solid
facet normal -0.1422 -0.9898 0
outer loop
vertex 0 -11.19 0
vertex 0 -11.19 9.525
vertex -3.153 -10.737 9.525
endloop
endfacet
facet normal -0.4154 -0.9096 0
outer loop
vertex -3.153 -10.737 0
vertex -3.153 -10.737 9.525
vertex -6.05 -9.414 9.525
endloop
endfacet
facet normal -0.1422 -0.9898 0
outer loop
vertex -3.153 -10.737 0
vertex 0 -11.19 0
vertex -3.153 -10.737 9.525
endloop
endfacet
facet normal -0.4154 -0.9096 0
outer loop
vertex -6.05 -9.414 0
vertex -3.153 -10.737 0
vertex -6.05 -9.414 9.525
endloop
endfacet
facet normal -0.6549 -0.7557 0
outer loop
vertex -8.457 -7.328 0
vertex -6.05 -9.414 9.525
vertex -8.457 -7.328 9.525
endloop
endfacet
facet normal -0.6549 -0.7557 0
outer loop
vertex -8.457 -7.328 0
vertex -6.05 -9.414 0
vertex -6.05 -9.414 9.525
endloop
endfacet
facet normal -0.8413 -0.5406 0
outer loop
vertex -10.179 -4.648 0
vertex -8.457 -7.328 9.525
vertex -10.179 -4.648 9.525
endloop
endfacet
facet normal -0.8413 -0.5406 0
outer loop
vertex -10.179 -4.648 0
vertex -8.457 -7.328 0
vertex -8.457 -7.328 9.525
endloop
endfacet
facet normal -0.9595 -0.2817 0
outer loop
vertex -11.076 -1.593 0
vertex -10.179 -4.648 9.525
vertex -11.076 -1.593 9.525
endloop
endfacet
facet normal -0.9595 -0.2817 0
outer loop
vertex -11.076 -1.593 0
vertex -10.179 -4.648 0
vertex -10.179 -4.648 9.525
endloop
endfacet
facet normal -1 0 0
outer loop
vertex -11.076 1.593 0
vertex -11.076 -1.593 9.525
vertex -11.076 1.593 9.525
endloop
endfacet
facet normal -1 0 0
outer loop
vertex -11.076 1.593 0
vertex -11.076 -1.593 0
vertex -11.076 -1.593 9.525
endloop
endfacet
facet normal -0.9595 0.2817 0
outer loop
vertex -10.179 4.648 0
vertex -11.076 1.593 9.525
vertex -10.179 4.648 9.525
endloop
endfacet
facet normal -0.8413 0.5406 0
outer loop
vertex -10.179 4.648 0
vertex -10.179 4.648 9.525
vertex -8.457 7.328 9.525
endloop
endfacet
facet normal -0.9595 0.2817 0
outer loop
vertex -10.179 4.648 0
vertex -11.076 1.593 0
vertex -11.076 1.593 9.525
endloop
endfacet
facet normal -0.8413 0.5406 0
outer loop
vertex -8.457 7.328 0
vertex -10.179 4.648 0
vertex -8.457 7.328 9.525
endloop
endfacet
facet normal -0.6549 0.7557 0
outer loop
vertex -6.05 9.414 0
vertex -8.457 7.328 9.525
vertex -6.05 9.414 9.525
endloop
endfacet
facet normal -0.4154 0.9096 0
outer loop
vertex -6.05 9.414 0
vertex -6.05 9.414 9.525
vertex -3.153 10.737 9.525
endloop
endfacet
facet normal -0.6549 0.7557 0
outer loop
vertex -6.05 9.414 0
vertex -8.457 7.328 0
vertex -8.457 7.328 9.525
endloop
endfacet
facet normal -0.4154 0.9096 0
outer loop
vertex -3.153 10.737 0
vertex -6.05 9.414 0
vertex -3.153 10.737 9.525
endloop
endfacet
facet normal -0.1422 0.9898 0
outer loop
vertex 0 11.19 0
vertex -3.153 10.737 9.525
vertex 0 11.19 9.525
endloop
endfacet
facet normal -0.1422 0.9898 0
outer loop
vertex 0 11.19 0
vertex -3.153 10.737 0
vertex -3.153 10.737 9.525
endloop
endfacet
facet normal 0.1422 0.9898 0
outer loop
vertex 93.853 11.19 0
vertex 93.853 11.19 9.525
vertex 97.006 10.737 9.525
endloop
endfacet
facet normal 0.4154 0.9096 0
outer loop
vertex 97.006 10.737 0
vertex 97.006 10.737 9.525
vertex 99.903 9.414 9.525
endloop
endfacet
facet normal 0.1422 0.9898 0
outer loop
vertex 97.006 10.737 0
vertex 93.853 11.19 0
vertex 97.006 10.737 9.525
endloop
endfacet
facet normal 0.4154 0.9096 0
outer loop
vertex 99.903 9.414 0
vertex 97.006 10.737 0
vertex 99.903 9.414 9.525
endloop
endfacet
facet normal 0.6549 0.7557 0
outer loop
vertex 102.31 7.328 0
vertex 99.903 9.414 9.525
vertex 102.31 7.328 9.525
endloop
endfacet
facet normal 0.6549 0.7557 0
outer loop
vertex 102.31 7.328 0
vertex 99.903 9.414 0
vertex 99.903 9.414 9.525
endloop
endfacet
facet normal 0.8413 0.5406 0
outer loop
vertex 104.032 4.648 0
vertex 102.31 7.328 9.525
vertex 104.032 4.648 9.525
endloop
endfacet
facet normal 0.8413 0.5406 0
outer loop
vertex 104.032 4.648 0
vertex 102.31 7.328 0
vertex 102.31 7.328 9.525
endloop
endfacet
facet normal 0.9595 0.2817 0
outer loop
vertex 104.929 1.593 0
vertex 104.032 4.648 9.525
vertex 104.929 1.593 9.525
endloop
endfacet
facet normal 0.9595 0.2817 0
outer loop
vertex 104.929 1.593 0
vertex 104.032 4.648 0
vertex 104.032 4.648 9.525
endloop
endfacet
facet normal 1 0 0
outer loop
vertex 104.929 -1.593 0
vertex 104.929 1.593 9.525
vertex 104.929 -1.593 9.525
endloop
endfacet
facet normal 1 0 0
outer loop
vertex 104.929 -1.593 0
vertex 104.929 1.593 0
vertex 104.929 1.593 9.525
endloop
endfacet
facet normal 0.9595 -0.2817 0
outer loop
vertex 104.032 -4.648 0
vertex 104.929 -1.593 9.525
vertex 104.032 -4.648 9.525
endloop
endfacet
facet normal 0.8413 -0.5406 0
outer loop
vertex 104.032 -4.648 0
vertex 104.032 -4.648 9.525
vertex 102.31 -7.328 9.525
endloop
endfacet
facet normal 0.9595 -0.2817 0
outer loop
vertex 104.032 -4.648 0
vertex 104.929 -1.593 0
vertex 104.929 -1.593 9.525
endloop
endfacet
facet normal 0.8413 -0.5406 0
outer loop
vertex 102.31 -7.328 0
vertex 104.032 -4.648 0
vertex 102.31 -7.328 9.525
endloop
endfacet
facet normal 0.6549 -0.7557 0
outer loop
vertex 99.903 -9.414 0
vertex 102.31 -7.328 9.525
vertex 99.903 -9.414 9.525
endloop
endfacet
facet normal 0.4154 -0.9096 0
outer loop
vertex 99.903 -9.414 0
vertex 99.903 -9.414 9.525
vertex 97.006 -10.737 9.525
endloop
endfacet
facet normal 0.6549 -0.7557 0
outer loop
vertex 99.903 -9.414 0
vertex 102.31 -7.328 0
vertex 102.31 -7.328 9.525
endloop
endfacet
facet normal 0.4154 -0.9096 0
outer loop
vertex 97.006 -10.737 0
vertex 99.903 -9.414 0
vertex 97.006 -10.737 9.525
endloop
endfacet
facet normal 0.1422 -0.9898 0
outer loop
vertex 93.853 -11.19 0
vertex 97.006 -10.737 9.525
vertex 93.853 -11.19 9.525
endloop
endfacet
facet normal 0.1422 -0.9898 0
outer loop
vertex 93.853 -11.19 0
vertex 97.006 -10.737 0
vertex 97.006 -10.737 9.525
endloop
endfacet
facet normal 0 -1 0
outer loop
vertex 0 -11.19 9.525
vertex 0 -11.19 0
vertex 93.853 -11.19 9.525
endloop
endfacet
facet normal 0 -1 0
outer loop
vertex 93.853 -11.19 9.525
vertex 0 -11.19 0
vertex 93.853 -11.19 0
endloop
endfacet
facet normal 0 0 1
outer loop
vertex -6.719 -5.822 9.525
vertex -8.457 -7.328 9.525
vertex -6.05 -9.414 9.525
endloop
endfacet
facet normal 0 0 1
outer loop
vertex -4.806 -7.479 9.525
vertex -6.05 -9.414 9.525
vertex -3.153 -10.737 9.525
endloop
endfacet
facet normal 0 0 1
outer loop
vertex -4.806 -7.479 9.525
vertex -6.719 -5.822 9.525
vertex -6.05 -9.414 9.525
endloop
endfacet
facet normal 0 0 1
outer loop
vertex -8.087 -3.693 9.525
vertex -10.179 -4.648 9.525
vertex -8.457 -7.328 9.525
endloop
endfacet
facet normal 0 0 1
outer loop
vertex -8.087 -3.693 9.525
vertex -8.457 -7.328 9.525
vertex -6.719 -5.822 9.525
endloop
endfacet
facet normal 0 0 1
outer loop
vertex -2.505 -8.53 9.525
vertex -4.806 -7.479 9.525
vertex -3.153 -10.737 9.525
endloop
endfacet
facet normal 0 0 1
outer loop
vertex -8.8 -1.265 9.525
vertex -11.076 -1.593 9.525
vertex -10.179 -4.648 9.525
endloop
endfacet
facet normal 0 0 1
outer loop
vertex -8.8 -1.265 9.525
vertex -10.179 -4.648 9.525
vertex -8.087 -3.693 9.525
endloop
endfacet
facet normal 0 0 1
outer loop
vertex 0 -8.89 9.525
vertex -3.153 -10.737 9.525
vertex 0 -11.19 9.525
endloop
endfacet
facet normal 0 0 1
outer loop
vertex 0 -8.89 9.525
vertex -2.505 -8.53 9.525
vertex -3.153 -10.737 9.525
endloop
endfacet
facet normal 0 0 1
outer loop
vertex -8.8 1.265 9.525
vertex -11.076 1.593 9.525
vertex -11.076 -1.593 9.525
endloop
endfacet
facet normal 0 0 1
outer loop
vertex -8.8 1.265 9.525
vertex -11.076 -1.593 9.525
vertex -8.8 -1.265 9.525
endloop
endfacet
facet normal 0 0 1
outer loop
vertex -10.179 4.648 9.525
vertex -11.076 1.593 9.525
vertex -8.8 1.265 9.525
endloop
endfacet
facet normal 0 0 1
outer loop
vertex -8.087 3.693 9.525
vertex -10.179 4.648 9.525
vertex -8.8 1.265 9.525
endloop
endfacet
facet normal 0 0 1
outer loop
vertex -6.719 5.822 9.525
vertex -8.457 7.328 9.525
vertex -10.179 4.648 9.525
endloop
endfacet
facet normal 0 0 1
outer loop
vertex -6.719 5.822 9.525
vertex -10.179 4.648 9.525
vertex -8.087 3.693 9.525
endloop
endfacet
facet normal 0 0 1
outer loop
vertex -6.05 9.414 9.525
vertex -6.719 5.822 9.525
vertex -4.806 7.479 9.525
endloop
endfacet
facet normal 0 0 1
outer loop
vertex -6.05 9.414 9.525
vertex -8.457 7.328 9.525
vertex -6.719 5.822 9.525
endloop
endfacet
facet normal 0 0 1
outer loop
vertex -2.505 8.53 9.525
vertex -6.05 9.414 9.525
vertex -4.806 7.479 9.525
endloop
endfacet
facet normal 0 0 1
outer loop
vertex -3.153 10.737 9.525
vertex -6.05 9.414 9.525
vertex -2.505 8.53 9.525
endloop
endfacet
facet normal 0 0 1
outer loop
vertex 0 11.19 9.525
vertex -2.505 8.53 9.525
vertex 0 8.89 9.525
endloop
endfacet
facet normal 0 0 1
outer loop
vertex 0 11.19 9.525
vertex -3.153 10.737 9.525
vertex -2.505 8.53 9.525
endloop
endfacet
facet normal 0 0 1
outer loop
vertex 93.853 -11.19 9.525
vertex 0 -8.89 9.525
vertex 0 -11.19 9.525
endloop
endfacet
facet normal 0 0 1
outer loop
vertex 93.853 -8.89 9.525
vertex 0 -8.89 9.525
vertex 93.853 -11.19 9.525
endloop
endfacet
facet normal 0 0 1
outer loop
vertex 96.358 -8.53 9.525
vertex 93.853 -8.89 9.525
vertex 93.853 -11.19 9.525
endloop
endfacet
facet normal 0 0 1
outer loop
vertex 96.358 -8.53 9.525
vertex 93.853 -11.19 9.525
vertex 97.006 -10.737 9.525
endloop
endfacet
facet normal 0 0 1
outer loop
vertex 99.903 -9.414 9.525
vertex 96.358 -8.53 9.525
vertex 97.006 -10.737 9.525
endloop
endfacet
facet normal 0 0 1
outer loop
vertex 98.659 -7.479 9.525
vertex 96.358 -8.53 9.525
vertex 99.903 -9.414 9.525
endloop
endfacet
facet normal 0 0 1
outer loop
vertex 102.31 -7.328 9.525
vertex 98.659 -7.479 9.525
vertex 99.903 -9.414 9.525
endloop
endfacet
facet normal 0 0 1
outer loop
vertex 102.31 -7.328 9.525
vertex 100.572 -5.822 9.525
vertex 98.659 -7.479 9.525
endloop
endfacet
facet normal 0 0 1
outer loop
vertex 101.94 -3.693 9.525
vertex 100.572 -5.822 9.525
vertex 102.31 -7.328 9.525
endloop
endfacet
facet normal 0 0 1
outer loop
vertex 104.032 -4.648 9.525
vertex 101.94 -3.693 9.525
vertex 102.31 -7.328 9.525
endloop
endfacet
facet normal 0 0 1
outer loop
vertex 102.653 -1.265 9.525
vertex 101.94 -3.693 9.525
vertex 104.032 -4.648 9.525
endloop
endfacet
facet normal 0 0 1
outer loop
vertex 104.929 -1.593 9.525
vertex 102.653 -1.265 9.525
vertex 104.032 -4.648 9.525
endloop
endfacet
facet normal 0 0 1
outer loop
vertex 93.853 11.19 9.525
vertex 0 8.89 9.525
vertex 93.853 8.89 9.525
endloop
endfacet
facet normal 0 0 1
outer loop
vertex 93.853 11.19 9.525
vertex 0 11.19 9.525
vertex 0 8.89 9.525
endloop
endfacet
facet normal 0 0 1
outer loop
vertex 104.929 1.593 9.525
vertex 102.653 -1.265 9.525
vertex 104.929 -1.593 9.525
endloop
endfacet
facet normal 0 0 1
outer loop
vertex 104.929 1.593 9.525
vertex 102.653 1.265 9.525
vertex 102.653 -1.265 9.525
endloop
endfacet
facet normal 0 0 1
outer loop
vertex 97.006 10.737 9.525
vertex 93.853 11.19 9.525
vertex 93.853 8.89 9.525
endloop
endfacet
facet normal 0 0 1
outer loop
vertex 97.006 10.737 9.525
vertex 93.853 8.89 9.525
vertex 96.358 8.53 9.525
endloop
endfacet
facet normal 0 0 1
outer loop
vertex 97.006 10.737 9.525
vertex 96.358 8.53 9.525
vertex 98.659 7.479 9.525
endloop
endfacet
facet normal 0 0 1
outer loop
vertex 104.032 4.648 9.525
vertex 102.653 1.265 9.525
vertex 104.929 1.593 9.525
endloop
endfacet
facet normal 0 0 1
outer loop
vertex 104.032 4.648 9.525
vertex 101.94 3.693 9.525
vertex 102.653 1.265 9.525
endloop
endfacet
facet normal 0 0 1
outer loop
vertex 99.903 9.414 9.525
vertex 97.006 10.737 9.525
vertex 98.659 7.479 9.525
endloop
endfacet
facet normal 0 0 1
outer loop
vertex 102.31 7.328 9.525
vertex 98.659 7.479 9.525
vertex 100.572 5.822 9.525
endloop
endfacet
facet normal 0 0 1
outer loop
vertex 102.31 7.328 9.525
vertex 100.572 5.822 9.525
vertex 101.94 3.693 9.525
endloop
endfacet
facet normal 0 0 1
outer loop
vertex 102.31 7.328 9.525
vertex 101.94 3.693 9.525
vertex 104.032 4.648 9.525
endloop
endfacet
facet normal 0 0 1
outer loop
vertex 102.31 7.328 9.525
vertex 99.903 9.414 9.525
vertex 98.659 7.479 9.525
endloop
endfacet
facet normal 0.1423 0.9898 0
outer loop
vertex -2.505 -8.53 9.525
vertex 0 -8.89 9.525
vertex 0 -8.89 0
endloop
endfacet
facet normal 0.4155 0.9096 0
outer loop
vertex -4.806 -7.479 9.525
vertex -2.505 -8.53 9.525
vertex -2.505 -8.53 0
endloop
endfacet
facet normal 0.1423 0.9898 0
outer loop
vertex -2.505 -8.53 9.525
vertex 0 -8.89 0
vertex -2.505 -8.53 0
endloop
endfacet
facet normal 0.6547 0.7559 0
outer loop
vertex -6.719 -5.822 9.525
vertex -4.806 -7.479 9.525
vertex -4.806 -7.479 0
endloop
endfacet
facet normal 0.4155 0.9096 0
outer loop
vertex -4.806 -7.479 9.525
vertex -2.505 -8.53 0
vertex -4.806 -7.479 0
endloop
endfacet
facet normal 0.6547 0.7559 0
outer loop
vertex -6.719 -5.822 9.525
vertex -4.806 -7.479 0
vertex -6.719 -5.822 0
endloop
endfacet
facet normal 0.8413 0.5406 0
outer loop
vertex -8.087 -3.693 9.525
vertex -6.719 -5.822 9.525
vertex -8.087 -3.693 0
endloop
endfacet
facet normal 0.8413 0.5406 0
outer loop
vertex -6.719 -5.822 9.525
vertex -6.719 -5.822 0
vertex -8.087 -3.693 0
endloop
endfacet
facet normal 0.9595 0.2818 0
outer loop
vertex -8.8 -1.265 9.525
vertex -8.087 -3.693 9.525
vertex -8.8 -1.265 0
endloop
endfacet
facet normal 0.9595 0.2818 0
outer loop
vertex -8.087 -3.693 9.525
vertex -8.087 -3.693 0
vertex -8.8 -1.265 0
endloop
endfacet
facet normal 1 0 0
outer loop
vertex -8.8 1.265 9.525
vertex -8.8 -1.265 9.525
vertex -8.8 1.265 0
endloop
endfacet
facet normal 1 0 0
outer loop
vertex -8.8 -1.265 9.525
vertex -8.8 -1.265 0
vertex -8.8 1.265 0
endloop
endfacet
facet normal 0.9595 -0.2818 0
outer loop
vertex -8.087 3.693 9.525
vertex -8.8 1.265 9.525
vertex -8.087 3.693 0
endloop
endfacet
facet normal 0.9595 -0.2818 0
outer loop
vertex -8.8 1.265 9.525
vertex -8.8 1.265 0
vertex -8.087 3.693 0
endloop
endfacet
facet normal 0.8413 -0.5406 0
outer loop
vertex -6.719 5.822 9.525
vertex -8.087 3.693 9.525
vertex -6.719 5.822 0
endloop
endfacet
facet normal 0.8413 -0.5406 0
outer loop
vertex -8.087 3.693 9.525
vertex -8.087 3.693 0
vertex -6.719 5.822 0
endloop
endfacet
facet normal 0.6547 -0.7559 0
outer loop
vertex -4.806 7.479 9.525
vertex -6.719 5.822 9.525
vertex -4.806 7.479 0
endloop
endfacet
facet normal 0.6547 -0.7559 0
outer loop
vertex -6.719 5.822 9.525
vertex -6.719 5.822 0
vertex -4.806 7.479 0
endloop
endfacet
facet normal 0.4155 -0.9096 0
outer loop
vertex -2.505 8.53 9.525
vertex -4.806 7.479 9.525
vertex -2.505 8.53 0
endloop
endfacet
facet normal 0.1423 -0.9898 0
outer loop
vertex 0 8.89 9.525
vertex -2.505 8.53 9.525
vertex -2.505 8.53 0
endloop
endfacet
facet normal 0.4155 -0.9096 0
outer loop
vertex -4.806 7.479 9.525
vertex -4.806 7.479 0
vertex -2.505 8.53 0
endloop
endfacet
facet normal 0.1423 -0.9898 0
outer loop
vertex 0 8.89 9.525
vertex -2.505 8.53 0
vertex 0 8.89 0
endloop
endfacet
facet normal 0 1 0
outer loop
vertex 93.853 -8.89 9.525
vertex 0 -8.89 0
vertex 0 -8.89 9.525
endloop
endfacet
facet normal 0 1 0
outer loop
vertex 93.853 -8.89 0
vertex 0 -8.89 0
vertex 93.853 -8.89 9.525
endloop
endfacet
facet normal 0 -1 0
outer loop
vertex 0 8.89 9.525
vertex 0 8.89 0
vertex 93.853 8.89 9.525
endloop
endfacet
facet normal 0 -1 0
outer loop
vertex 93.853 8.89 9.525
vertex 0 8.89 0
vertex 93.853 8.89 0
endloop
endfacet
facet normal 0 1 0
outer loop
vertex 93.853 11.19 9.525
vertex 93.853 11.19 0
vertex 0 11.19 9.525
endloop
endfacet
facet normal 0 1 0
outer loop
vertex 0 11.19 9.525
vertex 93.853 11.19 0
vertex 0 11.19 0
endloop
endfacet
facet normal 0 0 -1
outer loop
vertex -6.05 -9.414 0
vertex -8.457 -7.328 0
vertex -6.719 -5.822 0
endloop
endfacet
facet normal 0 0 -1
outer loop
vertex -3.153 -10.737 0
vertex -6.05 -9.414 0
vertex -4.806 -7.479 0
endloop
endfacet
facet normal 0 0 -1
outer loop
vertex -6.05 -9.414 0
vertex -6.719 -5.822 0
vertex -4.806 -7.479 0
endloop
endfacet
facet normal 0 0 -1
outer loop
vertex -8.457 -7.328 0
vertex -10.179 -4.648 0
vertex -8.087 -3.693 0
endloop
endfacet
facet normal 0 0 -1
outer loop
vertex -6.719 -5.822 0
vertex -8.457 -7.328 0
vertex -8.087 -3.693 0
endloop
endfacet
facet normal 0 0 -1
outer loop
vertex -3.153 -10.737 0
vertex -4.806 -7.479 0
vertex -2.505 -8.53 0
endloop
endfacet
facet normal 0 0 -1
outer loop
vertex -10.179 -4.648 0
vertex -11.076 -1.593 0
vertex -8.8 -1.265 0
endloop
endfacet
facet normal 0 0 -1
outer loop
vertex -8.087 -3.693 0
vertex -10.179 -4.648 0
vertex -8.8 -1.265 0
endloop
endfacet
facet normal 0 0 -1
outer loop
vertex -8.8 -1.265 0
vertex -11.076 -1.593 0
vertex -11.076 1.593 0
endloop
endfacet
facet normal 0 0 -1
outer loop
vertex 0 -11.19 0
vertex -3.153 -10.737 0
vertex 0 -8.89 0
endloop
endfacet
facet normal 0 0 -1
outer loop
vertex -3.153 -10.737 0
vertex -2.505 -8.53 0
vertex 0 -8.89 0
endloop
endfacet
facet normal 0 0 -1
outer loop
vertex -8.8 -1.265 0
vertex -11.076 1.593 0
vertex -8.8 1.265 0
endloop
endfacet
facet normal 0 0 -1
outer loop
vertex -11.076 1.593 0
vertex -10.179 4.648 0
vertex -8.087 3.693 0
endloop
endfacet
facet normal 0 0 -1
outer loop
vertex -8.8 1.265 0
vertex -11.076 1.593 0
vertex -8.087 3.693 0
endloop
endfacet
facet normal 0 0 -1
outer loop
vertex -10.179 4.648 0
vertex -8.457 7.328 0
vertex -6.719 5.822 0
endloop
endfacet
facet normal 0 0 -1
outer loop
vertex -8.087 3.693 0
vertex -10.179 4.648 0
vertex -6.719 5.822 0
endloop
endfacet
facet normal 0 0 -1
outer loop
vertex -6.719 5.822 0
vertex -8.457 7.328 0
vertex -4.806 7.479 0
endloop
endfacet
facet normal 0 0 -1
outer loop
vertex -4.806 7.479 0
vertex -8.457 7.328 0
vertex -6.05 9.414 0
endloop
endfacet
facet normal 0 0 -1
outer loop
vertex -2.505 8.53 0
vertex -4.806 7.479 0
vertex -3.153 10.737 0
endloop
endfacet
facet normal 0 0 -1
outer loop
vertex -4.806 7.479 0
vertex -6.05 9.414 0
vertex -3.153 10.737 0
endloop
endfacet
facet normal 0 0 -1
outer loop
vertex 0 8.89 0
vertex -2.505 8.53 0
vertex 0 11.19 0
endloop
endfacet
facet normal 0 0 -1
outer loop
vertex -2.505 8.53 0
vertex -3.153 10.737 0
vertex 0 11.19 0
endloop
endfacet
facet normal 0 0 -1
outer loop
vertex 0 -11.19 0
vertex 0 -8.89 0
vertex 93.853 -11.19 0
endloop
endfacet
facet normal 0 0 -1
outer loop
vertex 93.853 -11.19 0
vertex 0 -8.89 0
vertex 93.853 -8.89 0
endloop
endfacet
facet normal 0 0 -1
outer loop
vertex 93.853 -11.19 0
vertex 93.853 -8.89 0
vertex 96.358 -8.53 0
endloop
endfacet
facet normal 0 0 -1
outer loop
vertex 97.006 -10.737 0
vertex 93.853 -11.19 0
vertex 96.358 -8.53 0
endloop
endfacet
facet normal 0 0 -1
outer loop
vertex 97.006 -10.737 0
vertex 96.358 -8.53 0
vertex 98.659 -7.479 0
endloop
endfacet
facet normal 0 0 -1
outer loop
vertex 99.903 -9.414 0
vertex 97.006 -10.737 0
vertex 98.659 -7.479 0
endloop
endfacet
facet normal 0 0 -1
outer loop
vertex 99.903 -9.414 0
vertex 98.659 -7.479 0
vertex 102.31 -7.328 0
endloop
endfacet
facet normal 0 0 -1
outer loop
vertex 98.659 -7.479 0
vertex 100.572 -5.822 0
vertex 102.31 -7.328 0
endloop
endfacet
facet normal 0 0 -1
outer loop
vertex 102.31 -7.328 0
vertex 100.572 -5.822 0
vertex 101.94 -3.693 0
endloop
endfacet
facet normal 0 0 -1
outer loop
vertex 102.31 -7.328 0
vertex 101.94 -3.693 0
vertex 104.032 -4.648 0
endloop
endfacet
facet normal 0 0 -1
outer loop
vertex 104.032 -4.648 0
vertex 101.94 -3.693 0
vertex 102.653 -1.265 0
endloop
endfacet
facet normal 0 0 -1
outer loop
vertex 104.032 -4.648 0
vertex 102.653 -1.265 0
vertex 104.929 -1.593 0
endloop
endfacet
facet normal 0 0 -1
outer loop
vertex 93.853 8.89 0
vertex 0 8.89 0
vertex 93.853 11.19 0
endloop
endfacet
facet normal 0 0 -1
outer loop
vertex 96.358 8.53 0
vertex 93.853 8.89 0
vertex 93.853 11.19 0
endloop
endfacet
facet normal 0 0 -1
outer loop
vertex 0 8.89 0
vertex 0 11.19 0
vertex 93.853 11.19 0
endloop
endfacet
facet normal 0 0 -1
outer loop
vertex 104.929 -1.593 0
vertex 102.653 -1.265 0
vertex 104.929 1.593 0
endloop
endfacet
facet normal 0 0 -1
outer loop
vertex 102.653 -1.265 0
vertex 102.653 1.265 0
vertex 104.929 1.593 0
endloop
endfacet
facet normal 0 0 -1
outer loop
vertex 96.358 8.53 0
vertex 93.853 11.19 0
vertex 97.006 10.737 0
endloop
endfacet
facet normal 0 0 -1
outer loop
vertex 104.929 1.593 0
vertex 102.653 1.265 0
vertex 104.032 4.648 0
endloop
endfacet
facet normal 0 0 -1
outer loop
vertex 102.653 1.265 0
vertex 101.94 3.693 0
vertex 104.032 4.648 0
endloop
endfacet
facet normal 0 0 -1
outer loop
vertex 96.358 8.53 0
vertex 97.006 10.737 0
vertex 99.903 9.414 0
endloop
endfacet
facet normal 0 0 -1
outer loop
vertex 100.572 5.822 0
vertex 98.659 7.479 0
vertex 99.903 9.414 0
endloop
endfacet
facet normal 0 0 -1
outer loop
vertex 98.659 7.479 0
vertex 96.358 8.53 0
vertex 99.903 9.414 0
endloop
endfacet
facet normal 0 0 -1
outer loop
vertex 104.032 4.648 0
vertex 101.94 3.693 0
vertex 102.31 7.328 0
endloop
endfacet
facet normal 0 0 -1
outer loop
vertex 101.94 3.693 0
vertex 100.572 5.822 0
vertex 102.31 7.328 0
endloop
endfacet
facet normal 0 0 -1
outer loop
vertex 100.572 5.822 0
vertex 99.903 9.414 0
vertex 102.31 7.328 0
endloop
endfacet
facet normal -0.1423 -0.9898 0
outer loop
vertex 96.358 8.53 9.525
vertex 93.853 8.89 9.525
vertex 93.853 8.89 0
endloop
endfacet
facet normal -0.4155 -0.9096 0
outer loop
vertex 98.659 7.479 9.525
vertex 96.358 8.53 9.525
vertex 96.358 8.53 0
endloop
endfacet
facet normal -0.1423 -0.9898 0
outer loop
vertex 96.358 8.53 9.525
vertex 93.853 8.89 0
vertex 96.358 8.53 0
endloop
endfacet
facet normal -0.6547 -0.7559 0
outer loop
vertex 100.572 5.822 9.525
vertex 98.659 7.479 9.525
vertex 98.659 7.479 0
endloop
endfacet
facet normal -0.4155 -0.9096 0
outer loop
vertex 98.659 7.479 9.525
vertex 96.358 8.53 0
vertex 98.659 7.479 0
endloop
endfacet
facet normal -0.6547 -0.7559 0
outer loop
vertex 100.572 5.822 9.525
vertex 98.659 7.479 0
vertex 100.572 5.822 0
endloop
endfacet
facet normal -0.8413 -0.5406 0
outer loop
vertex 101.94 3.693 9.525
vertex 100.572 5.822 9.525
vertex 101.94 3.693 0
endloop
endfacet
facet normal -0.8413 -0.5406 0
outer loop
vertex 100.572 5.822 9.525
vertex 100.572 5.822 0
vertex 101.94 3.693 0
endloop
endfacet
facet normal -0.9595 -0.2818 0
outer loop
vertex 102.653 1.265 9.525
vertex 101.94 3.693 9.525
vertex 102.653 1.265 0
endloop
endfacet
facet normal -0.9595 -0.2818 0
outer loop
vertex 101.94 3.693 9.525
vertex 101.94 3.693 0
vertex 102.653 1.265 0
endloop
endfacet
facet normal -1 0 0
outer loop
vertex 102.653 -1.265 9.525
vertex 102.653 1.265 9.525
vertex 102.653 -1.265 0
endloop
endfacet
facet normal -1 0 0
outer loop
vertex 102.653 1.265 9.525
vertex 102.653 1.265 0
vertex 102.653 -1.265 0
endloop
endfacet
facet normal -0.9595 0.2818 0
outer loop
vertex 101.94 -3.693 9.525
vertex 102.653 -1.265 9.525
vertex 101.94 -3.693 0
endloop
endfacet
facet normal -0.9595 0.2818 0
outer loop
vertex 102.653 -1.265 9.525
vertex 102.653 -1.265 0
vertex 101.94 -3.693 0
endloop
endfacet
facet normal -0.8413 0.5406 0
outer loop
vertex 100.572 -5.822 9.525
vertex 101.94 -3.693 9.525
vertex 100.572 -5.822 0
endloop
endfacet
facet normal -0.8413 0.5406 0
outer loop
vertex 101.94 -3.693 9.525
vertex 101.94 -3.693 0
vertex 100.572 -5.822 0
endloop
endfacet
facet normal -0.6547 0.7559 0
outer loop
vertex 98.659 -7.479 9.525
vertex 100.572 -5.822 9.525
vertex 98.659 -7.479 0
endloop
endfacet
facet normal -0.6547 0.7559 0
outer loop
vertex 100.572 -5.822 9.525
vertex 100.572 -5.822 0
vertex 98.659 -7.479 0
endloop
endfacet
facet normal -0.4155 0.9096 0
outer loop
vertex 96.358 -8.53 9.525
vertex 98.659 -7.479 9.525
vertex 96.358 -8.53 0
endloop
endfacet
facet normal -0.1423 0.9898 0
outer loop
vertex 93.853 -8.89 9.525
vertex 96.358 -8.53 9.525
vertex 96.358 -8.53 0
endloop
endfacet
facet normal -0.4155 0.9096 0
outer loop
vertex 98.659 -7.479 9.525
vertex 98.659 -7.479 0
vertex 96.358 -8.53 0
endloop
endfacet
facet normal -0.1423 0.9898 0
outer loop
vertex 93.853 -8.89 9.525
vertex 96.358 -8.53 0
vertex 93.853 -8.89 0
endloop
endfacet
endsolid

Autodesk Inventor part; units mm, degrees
ref_plane "YZ Plane" through (0, 0, 0) normal (1, 0, 0) x (0, 1, 0)
ref_plane "XZ Plane" through (0, 0, 0) normal (0, 1, 0) x (-1, 0, 0)
ref_plane "XY Plane" through (0, 0, 0) normal (0, 0, 1) x (1, 0, 0)
sketch "Sketch1" plane through (0, 0, 0) normal (0, 0, 1) x (1, 0, 0)
  line L0 (0, 15.666) -> (0, -15.666) projected
  line L1 (-34.4366, 0) -> (128.2896, 0) projected
  line L2 (0, 0) -> (93.853, 0) construction
  line L3 (0, 8.89) -> (93.853, 8.89)
  line L4 (0, -8.89) -> (93.853, -8.89)
  arc A0 (0, 8.89) -> (0, -8.89) centre (0, 0) ccw
  arc A1 (93.853, -8.89) -> (93.853, 8.89) centre (93.853, 0) ccw
  line L5 (93.853, 11.19) -> (0, 11.19)
  arc A2 (0, 11.19) -> (0, -11.19) centre (0, 0) ccw
  line L6 (0, -11.19) -> (93.853, -11.19)
  arc A3 (93.853, -11.19) -> (93.853, 11.19) centre (93.853, 0) ccw
  dimension "d0" = 93.853
  dimension "d5" = 8.89
  dimension "d6" = 8.89
  dimension "d7" = 2.3
extrude "Extrusion1" add sketch "Sketch1" along normal blind 9.525 contours L5 A3 L1 A1 L3 L0 | L0 A0 L1 A2 | L1 A0 L0 A2 | A3 L6 L0 L4 A1 L1
properties part number "BBP MCMASTER 1679K116_BELT"
